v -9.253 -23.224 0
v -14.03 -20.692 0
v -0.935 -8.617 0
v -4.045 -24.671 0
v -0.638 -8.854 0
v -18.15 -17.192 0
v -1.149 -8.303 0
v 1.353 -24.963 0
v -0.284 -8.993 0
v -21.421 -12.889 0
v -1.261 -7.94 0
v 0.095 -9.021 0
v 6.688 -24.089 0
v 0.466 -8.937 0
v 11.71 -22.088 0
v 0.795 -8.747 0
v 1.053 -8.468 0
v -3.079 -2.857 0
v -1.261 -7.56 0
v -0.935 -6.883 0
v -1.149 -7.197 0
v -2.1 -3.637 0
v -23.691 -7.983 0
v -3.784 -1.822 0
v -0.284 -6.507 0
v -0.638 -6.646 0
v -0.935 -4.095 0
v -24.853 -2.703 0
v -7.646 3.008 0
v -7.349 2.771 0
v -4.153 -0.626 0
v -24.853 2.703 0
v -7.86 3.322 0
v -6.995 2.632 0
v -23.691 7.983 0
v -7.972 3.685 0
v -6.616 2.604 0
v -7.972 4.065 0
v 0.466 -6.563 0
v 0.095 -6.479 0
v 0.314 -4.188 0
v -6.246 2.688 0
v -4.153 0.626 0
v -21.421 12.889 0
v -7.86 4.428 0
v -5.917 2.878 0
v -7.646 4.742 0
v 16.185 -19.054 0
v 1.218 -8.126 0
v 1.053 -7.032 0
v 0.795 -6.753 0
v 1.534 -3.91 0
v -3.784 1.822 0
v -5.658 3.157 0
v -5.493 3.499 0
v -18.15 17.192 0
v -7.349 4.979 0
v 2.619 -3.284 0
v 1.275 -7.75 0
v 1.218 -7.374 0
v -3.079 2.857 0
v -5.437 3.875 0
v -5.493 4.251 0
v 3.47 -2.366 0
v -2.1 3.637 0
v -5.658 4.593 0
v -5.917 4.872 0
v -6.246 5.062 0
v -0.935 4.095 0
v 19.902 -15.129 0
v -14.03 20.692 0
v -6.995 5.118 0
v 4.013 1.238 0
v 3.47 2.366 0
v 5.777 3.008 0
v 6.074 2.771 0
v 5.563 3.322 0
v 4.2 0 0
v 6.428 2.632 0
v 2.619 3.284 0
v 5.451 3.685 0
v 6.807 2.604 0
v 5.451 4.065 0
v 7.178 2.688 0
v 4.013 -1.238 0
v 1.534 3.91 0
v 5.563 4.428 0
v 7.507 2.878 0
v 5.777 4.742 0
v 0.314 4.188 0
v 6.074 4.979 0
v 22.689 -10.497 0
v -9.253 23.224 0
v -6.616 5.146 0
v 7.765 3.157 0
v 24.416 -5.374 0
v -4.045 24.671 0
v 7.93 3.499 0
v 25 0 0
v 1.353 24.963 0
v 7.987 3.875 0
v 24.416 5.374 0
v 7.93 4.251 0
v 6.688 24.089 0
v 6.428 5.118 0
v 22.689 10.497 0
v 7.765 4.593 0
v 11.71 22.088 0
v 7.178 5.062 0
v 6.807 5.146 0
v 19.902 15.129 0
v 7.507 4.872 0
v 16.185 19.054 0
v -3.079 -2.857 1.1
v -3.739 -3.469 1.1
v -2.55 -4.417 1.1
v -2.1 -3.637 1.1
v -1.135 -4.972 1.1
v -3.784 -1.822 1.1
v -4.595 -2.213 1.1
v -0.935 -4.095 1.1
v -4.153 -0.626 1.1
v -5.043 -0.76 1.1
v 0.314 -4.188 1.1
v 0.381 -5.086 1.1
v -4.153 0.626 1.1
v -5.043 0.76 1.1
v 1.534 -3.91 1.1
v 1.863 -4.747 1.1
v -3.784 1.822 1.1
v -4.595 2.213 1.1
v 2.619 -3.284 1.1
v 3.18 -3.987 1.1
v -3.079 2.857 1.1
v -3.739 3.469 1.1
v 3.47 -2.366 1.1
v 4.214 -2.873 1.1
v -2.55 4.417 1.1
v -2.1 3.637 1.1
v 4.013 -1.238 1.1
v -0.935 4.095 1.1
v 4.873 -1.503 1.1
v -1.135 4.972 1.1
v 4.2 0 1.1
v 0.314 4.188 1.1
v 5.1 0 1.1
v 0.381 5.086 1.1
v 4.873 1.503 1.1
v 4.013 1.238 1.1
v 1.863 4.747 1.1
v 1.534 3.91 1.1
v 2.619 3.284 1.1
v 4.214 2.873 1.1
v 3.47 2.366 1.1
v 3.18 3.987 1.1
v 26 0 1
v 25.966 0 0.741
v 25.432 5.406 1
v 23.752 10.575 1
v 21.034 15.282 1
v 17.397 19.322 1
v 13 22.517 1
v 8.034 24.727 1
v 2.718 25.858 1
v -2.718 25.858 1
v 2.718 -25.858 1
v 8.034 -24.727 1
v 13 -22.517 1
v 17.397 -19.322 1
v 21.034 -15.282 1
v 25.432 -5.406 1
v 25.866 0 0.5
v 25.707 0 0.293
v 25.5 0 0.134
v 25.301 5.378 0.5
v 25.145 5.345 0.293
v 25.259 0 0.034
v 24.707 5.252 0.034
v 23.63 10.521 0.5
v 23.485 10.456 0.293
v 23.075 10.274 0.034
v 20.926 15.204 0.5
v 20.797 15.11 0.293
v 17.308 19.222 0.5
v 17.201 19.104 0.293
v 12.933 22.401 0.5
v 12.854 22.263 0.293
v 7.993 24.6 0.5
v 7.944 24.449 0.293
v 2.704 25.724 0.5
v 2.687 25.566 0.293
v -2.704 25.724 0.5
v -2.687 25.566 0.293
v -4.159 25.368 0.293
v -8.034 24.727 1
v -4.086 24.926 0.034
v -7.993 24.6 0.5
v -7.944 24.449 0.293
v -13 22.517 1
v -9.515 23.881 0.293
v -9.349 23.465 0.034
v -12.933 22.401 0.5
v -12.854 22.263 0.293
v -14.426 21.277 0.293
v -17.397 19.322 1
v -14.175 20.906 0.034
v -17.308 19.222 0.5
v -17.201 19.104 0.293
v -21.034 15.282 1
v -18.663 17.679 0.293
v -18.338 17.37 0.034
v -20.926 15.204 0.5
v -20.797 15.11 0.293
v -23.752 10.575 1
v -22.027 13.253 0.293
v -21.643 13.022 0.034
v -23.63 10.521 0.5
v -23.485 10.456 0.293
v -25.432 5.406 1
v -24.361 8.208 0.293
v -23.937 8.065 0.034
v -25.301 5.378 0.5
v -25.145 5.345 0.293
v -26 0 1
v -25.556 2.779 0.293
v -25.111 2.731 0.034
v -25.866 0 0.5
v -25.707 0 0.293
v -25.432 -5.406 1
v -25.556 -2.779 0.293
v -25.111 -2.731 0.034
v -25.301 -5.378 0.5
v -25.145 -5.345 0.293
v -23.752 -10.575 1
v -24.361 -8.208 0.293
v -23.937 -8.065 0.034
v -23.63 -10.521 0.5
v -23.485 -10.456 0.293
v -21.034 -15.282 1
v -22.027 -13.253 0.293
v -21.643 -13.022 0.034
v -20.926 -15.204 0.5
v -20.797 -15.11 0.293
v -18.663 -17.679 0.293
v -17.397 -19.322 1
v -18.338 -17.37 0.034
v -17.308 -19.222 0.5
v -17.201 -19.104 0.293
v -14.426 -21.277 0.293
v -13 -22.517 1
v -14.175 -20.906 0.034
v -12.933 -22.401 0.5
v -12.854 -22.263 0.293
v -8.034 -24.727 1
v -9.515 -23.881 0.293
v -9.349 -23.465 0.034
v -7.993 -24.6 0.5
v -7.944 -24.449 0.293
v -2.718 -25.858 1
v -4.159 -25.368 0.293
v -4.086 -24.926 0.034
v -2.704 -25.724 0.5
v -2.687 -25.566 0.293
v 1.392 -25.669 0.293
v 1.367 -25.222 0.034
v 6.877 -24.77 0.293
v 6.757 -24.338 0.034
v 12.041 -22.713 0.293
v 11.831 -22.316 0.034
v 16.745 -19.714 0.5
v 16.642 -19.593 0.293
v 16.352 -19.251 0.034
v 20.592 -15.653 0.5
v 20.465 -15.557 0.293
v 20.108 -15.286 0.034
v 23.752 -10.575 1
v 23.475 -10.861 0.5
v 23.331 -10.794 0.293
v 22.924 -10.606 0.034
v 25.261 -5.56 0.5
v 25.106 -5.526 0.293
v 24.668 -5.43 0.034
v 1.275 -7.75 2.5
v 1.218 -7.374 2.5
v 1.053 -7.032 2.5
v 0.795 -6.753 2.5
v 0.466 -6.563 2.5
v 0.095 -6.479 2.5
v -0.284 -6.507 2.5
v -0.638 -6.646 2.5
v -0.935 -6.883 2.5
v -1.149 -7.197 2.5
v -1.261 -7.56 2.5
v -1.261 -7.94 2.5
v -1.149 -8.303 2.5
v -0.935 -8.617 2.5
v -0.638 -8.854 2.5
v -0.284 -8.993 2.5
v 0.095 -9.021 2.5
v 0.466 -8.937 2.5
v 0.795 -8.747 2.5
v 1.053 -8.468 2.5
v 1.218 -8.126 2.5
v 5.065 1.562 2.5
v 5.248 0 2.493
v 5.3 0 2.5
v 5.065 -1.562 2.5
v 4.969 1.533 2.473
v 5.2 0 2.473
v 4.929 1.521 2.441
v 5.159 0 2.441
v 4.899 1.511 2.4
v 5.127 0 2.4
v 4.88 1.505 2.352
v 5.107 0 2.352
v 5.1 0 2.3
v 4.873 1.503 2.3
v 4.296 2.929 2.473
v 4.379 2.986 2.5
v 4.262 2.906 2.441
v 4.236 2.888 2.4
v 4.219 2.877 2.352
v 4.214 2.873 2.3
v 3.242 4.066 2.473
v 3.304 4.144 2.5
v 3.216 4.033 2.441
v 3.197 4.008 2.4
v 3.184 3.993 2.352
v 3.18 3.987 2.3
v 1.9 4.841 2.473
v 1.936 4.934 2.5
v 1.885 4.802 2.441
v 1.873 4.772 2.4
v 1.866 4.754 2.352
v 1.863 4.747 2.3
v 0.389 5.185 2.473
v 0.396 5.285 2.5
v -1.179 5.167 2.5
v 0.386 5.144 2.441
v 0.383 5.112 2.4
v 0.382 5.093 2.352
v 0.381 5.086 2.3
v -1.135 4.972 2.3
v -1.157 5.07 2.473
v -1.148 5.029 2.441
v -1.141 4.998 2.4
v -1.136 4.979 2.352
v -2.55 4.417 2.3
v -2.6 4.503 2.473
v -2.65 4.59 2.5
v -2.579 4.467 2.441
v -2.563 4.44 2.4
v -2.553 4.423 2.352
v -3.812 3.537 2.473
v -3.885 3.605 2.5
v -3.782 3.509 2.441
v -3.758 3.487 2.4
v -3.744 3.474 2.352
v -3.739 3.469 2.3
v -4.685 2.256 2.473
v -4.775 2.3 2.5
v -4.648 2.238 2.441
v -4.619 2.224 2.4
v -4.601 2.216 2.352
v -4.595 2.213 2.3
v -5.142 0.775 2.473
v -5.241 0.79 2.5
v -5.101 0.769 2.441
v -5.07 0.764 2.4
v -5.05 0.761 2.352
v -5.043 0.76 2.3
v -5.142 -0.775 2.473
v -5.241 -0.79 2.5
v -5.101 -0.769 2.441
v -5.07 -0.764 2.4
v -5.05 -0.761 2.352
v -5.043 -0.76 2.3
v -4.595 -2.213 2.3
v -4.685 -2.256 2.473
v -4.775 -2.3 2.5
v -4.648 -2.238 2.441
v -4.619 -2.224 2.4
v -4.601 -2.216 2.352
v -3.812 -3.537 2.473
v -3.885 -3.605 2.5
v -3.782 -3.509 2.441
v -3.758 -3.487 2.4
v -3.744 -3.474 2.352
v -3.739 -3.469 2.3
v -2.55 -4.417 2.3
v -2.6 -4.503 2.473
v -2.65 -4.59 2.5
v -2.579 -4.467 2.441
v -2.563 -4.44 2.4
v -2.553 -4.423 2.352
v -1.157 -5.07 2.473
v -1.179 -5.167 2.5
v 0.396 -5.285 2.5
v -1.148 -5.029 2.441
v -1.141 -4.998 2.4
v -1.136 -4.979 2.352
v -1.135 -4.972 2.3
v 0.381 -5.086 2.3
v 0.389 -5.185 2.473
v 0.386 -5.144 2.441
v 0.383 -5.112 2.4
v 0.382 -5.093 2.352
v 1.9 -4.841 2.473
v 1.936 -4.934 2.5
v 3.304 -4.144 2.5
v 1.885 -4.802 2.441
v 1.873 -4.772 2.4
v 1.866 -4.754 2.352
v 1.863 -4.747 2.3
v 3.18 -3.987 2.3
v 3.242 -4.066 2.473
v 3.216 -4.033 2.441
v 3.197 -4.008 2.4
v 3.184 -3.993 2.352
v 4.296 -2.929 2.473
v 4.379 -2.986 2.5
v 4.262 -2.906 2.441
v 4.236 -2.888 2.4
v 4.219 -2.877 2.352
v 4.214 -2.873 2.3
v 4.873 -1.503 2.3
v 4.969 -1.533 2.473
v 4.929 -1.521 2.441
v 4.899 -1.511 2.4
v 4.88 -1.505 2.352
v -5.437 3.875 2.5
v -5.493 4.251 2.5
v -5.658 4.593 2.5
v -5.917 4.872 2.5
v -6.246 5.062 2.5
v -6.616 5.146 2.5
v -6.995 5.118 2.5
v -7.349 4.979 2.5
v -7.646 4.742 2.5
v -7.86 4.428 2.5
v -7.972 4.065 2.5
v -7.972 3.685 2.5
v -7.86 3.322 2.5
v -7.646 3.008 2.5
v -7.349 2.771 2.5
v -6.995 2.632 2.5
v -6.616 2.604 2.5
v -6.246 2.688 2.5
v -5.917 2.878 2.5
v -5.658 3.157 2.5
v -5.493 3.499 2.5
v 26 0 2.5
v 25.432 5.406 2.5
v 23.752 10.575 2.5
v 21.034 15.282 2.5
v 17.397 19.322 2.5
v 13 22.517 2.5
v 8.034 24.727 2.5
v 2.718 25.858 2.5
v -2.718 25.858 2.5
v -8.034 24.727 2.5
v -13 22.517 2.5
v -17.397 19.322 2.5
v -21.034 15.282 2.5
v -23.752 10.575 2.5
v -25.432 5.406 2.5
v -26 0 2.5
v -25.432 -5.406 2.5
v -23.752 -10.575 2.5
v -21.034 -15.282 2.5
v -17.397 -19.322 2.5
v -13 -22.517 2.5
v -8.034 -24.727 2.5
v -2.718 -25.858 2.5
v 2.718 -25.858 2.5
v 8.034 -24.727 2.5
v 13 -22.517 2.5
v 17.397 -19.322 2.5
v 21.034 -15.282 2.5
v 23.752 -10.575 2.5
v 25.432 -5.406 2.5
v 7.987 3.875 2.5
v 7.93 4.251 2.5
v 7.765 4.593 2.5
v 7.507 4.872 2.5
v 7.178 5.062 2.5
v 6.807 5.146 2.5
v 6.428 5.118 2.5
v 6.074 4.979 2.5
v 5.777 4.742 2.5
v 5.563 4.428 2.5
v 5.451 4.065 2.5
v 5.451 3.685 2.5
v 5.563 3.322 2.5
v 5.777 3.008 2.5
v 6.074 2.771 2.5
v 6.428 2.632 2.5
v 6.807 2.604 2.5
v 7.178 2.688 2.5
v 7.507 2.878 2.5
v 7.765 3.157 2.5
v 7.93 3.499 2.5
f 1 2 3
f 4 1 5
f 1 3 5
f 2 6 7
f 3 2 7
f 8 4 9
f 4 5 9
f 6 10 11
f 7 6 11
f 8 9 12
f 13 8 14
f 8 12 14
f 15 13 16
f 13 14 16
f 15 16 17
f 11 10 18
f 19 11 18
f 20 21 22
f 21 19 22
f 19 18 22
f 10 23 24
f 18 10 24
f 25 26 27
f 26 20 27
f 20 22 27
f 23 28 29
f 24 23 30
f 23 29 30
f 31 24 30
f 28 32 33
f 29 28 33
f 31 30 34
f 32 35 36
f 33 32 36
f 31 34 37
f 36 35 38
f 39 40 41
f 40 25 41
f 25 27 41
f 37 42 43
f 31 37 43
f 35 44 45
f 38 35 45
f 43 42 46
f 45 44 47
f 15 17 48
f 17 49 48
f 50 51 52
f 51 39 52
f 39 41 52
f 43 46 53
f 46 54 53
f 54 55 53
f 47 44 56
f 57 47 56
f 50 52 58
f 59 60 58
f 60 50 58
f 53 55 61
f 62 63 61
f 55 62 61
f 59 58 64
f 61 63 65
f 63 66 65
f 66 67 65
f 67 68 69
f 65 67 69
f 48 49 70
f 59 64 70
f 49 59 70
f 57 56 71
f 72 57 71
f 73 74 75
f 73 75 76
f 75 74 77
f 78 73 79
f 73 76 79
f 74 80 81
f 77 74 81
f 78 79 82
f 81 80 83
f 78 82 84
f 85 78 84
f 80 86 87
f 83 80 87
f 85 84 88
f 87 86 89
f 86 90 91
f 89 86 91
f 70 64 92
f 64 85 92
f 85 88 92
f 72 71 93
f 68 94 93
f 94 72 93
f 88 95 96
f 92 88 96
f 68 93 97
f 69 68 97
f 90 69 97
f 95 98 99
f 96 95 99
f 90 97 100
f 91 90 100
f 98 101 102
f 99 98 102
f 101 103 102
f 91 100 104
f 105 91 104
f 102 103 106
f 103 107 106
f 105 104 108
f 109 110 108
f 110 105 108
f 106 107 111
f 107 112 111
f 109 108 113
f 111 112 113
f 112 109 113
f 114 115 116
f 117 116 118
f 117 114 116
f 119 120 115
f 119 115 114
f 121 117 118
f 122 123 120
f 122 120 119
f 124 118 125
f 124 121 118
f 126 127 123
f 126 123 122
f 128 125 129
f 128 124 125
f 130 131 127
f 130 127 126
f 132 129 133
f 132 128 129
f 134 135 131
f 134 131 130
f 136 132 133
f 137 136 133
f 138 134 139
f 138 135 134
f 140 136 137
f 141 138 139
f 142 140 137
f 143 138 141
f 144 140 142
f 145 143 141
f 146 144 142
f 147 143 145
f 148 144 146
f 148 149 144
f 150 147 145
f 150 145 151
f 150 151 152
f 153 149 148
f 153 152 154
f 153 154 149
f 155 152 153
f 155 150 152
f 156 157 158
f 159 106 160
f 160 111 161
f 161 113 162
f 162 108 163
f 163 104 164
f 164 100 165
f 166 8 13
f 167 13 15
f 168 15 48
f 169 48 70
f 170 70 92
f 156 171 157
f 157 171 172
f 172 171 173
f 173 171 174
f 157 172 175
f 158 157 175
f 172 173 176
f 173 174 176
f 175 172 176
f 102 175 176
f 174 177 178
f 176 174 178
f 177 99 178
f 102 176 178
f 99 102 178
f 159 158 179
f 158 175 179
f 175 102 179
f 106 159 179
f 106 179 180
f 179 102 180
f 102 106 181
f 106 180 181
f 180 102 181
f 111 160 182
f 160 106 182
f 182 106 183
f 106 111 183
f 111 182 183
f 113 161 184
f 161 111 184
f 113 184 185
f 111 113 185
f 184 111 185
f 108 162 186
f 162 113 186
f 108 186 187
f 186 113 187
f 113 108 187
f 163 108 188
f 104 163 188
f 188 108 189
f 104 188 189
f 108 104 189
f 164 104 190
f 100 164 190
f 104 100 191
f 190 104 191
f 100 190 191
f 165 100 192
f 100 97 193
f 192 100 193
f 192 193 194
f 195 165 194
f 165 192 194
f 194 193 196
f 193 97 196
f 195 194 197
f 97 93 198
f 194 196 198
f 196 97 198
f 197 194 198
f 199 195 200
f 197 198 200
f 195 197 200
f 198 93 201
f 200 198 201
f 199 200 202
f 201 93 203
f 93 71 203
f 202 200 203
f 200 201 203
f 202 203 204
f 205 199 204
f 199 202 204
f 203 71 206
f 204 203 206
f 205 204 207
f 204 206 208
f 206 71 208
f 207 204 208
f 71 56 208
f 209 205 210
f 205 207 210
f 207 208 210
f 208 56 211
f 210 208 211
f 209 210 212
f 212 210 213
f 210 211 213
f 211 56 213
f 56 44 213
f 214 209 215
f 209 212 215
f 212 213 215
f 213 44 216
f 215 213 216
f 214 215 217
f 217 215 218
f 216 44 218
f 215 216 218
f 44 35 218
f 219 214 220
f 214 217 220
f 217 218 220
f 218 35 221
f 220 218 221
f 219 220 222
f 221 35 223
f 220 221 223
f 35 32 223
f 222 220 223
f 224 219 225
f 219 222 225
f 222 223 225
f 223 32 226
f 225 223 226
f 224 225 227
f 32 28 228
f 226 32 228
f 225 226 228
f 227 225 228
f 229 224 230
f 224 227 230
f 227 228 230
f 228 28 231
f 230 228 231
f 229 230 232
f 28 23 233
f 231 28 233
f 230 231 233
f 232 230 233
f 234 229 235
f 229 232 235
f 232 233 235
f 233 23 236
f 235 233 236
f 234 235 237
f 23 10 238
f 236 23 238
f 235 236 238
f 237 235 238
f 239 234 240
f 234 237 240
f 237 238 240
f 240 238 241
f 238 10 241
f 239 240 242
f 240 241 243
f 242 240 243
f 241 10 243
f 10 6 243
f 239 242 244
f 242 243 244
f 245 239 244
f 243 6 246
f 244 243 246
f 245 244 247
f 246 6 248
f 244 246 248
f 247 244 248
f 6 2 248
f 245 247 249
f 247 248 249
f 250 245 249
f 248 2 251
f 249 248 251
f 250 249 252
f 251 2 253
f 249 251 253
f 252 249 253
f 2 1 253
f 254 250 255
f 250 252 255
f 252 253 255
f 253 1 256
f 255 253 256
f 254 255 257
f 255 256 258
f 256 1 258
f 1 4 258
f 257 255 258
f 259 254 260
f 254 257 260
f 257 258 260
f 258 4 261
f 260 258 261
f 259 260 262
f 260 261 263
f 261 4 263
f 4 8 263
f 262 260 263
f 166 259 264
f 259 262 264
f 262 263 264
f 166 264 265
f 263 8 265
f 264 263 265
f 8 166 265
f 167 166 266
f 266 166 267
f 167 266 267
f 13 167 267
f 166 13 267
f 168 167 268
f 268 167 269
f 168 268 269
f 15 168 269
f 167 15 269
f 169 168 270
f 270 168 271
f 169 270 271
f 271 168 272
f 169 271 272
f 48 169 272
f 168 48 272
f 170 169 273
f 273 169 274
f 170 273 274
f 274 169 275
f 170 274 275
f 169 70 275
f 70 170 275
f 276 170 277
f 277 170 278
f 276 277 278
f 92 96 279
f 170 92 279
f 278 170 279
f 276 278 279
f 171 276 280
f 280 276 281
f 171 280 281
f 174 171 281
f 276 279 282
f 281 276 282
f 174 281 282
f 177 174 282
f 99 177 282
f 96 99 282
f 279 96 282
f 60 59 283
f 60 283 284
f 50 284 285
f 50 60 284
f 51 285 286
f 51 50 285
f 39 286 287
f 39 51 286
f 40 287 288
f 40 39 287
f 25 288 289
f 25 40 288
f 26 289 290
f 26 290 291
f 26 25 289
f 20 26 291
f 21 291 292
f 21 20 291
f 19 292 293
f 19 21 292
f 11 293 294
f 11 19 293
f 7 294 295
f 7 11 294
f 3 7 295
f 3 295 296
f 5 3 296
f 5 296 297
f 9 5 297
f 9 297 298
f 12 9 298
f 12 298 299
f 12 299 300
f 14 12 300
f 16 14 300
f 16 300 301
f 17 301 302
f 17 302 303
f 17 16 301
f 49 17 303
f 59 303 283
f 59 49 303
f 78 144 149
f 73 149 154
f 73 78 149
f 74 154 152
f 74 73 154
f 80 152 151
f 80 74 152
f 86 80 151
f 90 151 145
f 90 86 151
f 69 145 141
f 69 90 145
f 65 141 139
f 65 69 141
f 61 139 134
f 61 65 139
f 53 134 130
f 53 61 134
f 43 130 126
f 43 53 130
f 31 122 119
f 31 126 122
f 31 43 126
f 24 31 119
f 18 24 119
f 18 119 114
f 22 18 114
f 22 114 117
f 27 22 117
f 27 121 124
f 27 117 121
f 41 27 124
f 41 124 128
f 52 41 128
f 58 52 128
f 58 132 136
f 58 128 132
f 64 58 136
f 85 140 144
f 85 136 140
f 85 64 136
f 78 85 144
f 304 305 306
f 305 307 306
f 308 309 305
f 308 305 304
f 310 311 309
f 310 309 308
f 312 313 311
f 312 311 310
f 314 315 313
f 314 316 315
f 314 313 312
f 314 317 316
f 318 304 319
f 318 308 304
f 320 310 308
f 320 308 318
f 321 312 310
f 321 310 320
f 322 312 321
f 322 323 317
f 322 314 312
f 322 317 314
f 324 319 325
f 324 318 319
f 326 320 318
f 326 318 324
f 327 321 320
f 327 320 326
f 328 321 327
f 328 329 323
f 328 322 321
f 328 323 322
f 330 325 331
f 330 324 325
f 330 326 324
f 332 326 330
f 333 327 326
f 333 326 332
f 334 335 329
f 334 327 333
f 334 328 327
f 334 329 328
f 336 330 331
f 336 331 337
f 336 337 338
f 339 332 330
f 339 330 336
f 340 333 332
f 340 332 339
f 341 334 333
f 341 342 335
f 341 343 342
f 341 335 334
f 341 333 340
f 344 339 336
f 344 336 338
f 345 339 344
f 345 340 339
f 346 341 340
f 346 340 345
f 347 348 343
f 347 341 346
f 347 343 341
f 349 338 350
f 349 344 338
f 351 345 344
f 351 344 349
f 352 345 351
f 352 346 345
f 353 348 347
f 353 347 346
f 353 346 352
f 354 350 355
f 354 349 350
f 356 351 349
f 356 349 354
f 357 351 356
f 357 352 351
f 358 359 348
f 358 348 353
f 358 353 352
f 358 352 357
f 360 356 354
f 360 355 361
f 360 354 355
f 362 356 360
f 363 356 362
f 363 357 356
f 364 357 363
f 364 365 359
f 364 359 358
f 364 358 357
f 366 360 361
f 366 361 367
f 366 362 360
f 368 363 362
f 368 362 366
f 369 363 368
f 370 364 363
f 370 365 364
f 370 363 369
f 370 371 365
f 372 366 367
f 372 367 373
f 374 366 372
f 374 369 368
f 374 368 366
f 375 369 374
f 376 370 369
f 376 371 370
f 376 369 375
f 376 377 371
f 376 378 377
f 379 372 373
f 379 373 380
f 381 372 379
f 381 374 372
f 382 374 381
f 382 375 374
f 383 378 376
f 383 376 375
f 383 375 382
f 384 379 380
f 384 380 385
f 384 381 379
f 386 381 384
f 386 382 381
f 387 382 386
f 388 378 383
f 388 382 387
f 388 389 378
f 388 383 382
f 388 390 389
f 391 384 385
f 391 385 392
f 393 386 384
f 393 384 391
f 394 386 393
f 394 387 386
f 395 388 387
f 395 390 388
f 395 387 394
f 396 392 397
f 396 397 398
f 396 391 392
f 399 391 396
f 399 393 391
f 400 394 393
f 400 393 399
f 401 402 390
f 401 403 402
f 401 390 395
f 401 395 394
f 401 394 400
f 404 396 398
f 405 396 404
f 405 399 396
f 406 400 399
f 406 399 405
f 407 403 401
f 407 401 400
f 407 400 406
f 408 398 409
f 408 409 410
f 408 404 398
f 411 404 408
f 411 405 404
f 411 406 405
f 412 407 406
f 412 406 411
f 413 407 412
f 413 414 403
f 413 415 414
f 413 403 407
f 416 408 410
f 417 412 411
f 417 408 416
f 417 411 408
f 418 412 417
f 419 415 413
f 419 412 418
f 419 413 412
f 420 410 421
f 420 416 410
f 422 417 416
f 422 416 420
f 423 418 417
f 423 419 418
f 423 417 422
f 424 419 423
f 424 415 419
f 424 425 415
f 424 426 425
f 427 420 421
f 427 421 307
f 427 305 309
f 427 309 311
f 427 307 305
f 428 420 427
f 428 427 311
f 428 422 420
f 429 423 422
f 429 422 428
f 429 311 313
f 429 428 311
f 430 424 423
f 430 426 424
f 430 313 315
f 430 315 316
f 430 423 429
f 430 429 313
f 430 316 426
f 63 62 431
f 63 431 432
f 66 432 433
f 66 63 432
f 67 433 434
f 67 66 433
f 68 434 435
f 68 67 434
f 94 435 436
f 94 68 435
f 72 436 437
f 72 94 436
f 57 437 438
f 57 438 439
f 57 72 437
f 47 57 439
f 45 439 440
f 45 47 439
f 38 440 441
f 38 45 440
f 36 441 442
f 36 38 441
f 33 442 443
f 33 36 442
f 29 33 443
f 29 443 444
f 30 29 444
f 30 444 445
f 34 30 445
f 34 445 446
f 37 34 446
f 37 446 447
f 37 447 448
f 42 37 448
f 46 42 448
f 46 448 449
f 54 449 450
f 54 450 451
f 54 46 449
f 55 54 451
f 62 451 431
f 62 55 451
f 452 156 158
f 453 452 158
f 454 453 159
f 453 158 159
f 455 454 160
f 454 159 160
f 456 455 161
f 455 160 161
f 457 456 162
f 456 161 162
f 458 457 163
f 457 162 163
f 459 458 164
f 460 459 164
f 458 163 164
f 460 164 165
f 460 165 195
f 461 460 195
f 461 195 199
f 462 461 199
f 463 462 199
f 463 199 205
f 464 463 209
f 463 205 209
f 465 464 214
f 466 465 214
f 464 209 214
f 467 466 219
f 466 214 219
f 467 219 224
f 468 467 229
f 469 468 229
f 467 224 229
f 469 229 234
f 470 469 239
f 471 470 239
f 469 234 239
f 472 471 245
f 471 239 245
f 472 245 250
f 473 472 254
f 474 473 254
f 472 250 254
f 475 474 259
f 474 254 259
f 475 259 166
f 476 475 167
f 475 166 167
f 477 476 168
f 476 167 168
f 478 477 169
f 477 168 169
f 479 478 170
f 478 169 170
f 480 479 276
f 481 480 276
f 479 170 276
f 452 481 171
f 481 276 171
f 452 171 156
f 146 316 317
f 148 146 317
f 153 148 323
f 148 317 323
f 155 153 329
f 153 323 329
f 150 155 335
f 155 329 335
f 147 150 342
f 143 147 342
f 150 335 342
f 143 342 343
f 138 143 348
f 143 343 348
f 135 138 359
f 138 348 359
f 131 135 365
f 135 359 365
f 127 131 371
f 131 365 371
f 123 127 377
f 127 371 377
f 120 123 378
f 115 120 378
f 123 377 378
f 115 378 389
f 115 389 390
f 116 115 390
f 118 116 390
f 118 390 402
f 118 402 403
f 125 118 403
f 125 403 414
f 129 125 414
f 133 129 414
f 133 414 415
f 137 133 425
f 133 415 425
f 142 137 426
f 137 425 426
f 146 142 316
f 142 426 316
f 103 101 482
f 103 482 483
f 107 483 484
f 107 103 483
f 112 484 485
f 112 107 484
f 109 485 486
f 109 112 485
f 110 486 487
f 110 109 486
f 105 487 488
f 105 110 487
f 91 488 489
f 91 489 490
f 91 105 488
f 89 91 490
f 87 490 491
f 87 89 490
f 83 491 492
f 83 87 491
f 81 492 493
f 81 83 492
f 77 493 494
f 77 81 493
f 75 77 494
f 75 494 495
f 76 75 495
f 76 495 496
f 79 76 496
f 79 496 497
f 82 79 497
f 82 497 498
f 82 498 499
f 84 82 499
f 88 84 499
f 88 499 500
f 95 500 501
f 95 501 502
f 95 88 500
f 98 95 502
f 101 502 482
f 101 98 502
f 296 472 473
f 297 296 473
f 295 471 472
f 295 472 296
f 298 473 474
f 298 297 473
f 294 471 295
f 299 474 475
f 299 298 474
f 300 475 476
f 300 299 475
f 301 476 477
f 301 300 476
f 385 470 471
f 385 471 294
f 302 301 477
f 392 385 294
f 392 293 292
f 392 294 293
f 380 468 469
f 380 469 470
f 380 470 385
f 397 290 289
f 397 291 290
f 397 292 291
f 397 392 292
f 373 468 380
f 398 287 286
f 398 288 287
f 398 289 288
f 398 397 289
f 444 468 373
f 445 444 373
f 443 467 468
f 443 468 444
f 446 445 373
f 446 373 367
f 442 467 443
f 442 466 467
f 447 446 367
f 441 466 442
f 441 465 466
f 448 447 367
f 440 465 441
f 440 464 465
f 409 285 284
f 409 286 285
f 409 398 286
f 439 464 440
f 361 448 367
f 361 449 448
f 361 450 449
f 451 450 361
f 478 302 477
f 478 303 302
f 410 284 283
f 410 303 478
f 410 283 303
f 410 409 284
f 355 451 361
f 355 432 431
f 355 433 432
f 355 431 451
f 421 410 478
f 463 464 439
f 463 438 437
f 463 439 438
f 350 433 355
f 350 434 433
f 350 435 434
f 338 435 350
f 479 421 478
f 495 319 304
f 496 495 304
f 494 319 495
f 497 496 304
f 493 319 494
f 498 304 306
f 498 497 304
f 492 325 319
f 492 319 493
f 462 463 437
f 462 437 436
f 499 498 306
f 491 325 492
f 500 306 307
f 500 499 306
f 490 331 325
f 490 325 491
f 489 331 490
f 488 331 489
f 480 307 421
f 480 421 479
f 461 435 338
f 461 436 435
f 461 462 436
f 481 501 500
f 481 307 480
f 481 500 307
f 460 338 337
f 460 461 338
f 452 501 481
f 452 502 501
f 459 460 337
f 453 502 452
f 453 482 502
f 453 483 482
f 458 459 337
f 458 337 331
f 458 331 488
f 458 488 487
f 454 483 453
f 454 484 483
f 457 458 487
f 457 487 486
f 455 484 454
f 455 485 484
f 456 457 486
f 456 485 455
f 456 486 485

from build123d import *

# Parameters (mm, degrees)
SKETCH1_R           = 26
SKETCH1_R_2         = 4.2
SKETCH1_R_3         = 1.275
BOSS_EXTRUDE1_DEPTH = 2.5
SKETCH2_R           = 5.1
CUT_EXTRUDE1_DEPTH  = 1.4
FILLET1_R           = 0.2
FILLET2_R           = 1


with BuildPart() as part:
    # Sketch1 → Boss-Extrude1 (new body)
    with BuildSketch(Plane.XY):
        Circle(SKETCH1_R)
        Circle(SKETCH1_R_2, mode=Mode.SUBTRACT)
        with Locations((0, -7.75)):
            Circle(SKETCH1_R_3, mode=Mode.SUBTRACT)
        with Locations((-6.711696879, 3.875)):
            Circle(SKETCH1_R_3, mode=Mode.SUBTRACT)
        with Locations((6.711696879, 3.875)):
            Circle(SKETCH1_R_3, mode=Mode.SUBTRACT)
    extrude(amount=BOSS_EXTRUDE1_DEPTH)

    # Sketch2 → Cut-Extrude1 (cut)
    with BuildSketch(Plane.XY.offset(2.5)):
        Circle(SKETCH2_R)
    extrude(amount=-CUT_EXTRUDE1_DEPTH, mode=Mode.SUBTRACT)

    # Fillet1
    fillet1_edges = [part.edges().sort_by_distance(p)[0] for p in [
        (-5.1, 0, 2.5),
    ]]
    fillet(fillet1_edges, radius=FILLET1_R)

    # Fillet2
    fillet2_edges = [part.edges().sort_by_distance(p)[0] for p in [
        (-26, 0, 0),
    ]]
    fillet(fillet2_edges, radius=FILLET2_R)


solid = part.part
